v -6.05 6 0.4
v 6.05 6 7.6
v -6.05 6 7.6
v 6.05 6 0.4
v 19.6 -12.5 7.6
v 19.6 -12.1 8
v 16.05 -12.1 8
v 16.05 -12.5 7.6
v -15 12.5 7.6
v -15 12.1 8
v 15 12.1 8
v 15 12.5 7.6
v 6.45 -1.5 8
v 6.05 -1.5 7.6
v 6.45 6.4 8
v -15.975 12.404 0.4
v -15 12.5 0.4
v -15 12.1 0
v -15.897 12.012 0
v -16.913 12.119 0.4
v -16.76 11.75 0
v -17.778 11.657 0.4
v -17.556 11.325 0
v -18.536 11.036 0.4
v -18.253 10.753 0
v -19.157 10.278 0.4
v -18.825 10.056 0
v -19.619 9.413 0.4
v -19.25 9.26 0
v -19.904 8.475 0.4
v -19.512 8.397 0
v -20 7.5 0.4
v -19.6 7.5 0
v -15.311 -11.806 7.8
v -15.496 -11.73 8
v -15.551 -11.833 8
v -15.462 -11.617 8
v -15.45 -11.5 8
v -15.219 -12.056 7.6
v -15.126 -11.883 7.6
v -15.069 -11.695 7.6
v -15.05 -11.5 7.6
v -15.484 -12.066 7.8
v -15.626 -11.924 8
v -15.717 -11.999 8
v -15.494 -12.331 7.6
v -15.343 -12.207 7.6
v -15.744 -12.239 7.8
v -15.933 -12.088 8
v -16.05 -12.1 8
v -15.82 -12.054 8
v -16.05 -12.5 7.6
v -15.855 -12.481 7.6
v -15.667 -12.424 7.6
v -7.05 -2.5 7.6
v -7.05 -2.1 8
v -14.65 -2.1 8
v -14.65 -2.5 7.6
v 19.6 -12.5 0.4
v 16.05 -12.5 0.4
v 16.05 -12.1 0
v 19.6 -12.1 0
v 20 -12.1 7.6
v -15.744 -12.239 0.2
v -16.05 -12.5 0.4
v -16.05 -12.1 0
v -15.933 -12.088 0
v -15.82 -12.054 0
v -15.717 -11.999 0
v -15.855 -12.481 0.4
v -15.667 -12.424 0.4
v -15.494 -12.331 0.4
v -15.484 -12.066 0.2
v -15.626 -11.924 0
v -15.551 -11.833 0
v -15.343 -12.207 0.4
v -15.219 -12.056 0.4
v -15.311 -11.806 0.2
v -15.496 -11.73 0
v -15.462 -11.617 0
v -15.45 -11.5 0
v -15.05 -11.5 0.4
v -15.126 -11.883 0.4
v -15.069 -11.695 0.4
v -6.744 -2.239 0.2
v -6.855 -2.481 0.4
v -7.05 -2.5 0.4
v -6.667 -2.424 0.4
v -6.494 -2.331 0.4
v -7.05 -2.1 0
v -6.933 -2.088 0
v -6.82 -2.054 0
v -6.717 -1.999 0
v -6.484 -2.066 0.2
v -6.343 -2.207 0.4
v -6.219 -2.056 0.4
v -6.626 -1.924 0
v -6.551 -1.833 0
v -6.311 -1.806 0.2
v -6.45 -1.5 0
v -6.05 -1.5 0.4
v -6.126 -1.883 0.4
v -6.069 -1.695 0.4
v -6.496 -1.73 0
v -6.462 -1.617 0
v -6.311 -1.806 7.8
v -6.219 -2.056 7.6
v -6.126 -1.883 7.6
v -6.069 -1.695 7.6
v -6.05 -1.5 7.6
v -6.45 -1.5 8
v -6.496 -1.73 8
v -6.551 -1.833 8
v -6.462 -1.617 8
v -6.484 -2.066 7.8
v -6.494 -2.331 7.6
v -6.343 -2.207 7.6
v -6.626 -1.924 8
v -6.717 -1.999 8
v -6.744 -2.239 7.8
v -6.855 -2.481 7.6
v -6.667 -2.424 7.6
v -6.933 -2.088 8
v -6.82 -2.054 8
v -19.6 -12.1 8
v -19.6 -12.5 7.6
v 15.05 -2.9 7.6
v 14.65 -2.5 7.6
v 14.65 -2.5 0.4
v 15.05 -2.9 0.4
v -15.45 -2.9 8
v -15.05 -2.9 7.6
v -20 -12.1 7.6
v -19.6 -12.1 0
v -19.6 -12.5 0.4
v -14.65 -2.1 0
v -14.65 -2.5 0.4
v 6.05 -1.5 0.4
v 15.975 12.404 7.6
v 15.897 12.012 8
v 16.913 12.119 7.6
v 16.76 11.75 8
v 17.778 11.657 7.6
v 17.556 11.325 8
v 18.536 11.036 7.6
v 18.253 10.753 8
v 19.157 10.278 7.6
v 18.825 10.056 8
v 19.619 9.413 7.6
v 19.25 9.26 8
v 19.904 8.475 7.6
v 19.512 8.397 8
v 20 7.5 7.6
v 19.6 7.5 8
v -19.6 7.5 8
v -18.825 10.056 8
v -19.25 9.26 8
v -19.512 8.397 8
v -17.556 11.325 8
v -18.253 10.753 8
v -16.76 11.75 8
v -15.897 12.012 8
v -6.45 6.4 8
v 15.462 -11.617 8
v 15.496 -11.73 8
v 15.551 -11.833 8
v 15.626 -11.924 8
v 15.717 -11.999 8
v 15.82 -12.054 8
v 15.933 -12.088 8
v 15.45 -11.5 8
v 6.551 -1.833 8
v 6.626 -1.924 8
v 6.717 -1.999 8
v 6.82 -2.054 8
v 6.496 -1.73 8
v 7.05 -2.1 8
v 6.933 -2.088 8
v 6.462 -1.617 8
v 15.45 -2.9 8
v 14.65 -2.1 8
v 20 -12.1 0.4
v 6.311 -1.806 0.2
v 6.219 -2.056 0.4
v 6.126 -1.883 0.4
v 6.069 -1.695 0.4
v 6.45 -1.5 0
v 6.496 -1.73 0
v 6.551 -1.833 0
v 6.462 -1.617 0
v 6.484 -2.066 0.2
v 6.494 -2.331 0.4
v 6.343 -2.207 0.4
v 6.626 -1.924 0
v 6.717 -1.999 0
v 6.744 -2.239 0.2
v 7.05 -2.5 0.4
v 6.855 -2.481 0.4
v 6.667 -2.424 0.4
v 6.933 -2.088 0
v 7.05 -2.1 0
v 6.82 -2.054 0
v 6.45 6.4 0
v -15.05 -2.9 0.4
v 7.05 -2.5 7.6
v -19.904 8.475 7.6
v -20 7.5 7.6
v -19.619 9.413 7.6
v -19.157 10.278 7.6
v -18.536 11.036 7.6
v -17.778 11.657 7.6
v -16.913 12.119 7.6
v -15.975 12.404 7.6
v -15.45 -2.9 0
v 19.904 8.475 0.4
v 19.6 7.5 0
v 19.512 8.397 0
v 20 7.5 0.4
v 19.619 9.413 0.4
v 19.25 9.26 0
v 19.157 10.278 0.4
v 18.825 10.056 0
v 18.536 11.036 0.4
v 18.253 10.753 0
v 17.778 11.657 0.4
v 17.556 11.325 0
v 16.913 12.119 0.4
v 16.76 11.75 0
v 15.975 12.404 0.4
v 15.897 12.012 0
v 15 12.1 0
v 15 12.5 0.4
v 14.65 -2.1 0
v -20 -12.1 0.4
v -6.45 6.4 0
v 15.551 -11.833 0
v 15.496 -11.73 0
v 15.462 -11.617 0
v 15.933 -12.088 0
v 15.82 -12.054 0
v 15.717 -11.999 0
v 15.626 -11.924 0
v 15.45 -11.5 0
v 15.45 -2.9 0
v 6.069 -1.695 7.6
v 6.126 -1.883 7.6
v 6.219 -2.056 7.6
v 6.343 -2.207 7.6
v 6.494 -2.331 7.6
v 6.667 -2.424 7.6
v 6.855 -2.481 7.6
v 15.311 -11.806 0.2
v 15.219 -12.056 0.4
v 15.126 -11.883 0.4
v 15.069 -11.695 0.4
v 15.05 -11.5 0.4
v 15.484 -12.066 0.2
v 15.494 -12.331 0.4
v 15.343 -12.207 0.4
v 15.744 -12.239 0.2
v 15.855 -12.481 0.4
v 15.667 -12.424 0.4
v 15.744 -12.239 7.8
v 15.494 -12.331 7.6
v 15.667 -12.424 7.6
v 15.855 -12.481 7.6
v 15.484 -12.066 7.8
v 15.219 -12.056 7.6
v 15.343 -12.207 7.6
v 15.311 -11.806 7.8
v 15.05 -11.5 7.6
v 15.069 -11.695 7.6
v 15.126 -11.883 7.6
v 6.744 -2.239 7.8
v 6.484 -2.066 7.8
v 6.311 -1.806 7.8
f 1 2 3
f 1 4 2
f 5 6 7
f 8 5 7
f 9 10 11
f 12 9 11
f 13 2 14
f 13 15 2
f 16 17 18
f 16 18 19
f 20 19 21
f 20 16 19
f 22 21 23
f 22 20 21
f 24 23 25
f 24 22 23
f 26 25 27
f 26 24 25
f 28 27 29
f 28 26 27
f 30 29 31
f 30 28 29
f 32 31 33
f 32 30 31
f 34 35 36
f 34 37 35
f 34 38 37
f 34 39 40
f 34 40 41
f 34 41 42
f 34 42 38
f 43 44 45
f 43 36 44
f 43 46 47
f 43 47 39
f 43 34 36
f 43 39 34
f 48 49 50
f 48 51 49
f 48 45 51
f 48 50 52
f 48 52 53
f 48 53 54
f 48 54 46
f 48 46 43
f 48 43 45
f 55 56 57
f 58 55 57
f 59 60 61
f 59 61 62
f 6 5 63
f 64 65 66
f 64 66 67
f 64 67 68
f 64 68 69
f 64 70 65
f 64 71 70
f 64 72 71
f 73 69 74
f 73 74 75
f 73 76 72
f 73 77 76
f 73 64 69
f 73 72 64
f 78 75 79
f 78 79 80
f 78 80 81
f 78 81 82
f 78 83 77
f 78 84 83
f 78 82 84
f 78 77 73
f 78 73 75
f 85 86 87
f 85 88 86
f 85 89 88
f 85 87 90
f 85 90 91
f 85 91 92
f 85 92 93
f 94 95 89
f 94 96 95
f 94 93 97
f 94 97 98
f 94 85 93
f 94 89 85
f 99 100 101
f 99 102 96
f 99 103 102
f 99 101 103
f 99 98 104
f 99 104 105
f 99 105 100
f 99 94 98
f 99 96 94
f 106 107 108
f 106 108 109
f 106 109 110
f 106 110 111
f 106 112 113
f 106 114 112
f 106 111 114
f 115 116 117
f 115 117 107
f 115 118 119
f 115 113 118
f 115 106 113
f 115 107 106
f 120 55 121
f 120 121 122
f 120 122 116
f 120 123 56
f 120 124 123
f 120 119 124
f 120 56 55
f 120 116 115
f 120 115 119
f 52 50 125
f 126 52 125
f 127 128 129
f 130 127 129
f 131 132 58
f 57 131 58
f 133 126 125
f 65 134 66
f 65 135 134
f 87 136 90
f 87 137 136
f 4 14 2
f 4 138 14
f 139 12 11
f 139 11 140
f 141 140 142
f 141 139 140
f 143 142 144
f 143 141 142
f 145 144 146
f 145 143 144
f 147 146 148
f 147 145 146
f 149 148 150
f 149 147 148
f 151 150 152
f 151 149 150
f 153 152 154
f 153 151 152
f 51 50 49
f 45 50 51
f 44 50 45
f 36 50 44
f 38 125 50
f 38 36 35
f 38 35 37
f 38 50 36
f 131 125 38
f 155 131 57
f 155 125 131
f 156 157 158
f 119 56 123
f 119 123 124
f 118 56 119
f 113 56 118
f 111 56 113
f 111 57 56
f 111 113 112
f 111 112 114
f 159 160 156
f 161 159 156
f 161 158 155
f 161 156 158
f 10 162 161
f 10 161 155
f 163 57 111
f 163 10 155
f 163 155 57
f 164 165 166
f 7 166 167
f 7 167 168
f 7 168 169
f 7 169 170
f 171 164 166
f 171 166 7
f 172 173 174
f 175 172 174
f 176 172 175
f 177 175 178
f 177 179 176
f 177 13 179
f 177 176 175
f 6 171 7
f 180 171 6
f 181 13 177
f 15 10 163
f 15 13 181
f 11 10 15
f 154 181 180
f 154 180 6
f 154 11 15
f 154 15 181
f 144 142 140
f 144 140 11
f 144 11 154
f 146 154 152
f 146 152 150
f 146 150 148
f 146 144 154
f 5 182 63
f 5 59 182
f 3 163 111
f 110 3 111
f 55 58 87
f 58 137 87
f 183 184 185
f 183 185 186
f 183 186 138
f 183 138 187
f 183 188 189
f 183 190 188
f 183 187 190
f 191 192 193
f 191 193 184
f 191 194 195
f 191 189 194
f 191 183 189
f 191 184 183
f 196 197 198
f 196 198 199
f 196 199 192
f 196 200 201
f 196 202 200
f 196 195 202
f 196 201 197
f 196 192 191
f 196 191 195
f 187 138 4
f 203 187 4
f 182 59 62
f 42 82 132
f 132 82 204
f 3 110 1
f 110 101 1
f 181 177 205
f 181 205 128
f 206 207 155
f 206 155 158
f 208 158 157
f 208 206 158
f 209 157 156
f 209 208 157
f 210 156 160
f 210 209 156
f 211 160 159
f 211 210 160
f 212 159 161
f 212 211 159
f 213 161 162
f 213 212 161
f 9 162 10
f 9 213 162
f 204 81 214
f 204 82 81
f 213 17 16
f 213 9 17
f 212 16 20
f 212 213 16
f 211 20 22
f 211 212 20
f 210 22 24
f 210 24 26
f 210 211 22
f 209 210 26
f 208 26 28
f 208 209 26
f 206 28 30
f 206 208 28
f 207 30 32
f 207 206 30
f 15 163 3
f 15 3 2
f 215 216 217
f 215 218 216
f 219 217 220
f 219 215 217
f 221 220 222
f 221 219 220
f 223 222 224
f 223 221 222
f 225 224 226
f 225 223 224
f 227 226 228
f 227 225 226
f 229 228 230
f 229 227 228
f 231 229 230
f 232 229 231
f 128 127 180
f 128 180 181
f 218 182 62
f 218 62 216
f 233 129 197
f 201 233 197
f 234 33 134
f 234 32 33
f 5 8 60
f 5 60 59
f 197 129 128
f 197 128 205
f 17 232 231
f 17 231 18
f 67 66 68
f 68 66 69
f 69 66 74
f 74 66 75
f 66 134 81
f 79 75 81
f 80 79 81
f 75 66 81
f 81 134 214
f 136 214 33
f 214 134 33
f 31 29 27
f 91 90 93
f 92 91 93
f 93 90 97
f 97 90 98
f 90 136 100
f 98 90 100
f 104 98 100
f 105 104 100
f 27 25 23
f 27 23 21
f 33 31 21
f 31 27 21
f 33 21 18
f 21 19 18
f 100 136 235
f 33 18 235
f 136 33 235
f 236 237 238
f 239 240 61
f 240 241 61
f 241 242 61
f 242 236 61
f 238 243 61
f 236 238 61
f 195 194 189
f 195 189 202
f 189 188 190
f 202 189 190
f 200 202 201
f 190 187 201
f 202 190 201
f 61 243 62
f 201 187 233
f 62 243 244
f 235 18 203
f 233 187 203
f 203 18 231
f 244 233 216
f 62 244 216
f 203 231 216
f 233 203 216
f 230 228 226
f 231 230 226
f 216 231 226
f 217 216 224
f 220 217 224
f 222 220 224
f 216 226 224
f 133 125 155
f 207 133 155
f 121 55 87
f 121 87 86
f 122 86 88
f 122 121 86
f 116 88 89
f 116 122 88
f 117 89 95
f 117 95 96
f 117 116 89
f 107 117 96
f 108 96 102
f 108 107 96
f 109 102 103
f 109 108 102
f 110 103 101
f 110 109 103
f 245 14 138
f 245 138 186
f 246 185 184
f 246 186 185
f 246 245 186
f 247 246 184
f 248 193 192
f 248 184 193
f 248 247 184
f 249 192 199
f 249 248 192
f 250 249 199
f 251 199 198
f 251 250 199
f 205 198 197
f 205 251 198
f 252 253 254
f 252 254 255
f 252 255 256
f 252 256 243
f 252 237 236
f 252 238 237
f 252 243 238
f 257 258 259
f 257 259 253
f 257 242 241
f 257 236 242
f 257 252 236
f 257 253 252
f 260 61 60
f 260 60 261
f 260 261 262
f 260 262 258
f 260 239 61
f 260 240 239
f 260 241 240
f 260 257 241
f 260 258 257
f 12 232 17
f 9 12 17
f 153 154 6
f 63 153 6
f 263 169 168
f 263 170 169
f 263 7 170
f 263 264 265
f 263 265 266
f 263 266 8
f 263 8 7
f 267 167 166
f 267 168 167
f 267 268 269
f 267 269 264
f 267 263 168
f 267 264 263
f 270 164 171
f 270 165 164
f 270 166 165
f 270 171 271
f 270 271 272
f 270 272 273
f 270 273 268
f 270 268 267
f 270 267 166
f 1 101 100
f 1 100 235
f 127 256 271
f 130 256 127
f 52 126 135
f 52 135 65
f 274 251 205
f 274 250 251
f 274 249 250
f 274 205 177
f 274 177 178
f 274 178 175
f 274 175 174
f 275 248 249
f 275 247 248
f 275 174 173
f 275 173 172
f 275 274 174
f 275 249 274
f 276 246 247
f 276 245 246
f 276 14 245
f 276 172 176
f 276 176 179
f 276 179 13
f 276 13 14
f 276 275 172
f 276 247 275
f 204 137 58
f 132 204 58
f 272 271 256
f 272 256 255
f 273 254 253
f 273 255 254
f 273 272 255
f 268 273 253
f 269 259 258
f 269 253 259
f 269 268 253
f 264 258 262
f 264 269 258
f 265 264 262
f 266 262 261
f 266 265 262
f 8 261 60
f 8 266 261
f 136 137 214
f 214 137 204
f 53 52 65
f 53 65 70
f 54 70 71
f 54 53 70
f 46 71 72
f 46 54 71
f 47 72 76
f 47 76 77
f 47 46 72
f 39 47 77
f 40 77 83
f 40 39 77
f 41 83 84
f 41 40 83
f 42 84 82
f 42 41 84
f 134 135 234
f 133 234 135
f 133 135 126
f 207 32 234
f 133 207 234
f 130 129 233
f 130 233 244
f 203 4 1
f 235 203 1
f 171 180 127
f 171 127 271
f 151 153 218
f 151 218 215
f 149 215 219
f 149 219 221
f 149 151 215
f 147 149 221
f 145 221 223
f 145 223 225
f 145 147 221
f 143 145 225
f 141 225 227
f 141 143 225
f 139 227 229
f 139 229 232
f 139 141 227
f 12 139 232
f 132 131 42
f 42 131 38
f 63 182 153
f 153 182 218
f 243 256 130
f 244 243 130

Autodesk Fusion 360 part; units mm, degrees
sketch "Sketch1" plane through (0, 0, 0) normal (0, 0, 1) x (1, 0, 0)
  line L0 (20, 12.5) -> (-20, 12.5)
  line L1 (-20, 12.5) -> (-20, -12.5)
  line L2 (-20, -12.5) -> (20, -12.5)
  line L3 (20, -12.5) -> (20, 12.5)
  line L4 (20, 12.5) -> (-20, -12.5) construction
  line L5 (-20, 12.5) -> (20, -12.5) construction
  line L6 (-15.05, -12.5) -> (-15.05, -2.5)
  line L7 (-15.05, -2.5) -> (-6.05, -2.5)
  line L8 (0, 12.5) -> (0, -12.5) construction
  line L9 (-6.05, -2.5) -> (-6.05, 6)
  line L10 (-6.05, 6) -> (0, 6)
  line L11 (15.05, -12.5) -> (15.05, -2.5)
  line L12 (15.05, -2.5) -> (6.05, -2.5)
  line L13 (6.05, -2.5) -> (6.05, 6)
  line L14 (6.05, 6) -> (0, 6)
  dimension "d1" = 40
  dimension "d2" = 25
  dimension "d3" = 15.05
  dimension "d4" = 10
  dimension "d5" = 6.05
  dimension "d6" = 8.5
extrude "Extrude1" add sketch "Sketch1" along normal blind 8 contours L0 L1 L2 L3 L6 L7 L9 L10 L11 L12 L13 L14
fillet "Fillet1" radius 5 2 edges at (-20, 12.5, 4) (20, 12.5, 4)
fillet "Fillet2" radius 1 4 edges at (-6.05, -2.5, 4) (6.05, -2.5, 4) (-15.05, -12.5, 4) (15.05, -12.5, 4)
chamfer "Chamfer2" distance 0.4 angle 45 40 edges at (6.05, 2.25, 0) (6.3429, -2.2071, 0) (11.05, -2.5, 0) (0, 6, 0) (-11.05, -2.5, 0) (-6.3429, -2.2071, 0) (-6.05, 2.25, 0) (-18.025, -12.5, 0) (-15.3429, -12.2071, 0) (-15.05, -7, 0) (15.05, -7, 0) (15.3429, -12.2071, 0) (18.025, -12.5, 0) (20, -12.5, 4) (18.025, -12.5, 8) (15.3429, -12.2071, 8) (15.05, -7, 8) (-20, -12.5, 4) (-15.05, -7, 8) (-15.3429, -12.2071, 8) (-18.025, -12.5, 8) (-6.05, 2.25, 8) (-6.3429, -2.2071, 8) (-11.05, -2.5, 8) (0, 6, 8) (11.05, -2.5, 8) (6.3429, -2.2071, 8) (6.05, 2.25, 8) (20, -2.5, 8) (18.5355, 11.0355, 8) (0, 12.5, 8) (-18.5355, 11.0355, 8) (-20, -2.5, 8) (20, -2.5, 0) (18.5355, 11.0355, 0) (0, 12.5, 0) (-18.5355, 11.0355, 0) (-20, -2.5, 0) (-15.05, -2.5, 4) (15.05, -2.5, 4)
